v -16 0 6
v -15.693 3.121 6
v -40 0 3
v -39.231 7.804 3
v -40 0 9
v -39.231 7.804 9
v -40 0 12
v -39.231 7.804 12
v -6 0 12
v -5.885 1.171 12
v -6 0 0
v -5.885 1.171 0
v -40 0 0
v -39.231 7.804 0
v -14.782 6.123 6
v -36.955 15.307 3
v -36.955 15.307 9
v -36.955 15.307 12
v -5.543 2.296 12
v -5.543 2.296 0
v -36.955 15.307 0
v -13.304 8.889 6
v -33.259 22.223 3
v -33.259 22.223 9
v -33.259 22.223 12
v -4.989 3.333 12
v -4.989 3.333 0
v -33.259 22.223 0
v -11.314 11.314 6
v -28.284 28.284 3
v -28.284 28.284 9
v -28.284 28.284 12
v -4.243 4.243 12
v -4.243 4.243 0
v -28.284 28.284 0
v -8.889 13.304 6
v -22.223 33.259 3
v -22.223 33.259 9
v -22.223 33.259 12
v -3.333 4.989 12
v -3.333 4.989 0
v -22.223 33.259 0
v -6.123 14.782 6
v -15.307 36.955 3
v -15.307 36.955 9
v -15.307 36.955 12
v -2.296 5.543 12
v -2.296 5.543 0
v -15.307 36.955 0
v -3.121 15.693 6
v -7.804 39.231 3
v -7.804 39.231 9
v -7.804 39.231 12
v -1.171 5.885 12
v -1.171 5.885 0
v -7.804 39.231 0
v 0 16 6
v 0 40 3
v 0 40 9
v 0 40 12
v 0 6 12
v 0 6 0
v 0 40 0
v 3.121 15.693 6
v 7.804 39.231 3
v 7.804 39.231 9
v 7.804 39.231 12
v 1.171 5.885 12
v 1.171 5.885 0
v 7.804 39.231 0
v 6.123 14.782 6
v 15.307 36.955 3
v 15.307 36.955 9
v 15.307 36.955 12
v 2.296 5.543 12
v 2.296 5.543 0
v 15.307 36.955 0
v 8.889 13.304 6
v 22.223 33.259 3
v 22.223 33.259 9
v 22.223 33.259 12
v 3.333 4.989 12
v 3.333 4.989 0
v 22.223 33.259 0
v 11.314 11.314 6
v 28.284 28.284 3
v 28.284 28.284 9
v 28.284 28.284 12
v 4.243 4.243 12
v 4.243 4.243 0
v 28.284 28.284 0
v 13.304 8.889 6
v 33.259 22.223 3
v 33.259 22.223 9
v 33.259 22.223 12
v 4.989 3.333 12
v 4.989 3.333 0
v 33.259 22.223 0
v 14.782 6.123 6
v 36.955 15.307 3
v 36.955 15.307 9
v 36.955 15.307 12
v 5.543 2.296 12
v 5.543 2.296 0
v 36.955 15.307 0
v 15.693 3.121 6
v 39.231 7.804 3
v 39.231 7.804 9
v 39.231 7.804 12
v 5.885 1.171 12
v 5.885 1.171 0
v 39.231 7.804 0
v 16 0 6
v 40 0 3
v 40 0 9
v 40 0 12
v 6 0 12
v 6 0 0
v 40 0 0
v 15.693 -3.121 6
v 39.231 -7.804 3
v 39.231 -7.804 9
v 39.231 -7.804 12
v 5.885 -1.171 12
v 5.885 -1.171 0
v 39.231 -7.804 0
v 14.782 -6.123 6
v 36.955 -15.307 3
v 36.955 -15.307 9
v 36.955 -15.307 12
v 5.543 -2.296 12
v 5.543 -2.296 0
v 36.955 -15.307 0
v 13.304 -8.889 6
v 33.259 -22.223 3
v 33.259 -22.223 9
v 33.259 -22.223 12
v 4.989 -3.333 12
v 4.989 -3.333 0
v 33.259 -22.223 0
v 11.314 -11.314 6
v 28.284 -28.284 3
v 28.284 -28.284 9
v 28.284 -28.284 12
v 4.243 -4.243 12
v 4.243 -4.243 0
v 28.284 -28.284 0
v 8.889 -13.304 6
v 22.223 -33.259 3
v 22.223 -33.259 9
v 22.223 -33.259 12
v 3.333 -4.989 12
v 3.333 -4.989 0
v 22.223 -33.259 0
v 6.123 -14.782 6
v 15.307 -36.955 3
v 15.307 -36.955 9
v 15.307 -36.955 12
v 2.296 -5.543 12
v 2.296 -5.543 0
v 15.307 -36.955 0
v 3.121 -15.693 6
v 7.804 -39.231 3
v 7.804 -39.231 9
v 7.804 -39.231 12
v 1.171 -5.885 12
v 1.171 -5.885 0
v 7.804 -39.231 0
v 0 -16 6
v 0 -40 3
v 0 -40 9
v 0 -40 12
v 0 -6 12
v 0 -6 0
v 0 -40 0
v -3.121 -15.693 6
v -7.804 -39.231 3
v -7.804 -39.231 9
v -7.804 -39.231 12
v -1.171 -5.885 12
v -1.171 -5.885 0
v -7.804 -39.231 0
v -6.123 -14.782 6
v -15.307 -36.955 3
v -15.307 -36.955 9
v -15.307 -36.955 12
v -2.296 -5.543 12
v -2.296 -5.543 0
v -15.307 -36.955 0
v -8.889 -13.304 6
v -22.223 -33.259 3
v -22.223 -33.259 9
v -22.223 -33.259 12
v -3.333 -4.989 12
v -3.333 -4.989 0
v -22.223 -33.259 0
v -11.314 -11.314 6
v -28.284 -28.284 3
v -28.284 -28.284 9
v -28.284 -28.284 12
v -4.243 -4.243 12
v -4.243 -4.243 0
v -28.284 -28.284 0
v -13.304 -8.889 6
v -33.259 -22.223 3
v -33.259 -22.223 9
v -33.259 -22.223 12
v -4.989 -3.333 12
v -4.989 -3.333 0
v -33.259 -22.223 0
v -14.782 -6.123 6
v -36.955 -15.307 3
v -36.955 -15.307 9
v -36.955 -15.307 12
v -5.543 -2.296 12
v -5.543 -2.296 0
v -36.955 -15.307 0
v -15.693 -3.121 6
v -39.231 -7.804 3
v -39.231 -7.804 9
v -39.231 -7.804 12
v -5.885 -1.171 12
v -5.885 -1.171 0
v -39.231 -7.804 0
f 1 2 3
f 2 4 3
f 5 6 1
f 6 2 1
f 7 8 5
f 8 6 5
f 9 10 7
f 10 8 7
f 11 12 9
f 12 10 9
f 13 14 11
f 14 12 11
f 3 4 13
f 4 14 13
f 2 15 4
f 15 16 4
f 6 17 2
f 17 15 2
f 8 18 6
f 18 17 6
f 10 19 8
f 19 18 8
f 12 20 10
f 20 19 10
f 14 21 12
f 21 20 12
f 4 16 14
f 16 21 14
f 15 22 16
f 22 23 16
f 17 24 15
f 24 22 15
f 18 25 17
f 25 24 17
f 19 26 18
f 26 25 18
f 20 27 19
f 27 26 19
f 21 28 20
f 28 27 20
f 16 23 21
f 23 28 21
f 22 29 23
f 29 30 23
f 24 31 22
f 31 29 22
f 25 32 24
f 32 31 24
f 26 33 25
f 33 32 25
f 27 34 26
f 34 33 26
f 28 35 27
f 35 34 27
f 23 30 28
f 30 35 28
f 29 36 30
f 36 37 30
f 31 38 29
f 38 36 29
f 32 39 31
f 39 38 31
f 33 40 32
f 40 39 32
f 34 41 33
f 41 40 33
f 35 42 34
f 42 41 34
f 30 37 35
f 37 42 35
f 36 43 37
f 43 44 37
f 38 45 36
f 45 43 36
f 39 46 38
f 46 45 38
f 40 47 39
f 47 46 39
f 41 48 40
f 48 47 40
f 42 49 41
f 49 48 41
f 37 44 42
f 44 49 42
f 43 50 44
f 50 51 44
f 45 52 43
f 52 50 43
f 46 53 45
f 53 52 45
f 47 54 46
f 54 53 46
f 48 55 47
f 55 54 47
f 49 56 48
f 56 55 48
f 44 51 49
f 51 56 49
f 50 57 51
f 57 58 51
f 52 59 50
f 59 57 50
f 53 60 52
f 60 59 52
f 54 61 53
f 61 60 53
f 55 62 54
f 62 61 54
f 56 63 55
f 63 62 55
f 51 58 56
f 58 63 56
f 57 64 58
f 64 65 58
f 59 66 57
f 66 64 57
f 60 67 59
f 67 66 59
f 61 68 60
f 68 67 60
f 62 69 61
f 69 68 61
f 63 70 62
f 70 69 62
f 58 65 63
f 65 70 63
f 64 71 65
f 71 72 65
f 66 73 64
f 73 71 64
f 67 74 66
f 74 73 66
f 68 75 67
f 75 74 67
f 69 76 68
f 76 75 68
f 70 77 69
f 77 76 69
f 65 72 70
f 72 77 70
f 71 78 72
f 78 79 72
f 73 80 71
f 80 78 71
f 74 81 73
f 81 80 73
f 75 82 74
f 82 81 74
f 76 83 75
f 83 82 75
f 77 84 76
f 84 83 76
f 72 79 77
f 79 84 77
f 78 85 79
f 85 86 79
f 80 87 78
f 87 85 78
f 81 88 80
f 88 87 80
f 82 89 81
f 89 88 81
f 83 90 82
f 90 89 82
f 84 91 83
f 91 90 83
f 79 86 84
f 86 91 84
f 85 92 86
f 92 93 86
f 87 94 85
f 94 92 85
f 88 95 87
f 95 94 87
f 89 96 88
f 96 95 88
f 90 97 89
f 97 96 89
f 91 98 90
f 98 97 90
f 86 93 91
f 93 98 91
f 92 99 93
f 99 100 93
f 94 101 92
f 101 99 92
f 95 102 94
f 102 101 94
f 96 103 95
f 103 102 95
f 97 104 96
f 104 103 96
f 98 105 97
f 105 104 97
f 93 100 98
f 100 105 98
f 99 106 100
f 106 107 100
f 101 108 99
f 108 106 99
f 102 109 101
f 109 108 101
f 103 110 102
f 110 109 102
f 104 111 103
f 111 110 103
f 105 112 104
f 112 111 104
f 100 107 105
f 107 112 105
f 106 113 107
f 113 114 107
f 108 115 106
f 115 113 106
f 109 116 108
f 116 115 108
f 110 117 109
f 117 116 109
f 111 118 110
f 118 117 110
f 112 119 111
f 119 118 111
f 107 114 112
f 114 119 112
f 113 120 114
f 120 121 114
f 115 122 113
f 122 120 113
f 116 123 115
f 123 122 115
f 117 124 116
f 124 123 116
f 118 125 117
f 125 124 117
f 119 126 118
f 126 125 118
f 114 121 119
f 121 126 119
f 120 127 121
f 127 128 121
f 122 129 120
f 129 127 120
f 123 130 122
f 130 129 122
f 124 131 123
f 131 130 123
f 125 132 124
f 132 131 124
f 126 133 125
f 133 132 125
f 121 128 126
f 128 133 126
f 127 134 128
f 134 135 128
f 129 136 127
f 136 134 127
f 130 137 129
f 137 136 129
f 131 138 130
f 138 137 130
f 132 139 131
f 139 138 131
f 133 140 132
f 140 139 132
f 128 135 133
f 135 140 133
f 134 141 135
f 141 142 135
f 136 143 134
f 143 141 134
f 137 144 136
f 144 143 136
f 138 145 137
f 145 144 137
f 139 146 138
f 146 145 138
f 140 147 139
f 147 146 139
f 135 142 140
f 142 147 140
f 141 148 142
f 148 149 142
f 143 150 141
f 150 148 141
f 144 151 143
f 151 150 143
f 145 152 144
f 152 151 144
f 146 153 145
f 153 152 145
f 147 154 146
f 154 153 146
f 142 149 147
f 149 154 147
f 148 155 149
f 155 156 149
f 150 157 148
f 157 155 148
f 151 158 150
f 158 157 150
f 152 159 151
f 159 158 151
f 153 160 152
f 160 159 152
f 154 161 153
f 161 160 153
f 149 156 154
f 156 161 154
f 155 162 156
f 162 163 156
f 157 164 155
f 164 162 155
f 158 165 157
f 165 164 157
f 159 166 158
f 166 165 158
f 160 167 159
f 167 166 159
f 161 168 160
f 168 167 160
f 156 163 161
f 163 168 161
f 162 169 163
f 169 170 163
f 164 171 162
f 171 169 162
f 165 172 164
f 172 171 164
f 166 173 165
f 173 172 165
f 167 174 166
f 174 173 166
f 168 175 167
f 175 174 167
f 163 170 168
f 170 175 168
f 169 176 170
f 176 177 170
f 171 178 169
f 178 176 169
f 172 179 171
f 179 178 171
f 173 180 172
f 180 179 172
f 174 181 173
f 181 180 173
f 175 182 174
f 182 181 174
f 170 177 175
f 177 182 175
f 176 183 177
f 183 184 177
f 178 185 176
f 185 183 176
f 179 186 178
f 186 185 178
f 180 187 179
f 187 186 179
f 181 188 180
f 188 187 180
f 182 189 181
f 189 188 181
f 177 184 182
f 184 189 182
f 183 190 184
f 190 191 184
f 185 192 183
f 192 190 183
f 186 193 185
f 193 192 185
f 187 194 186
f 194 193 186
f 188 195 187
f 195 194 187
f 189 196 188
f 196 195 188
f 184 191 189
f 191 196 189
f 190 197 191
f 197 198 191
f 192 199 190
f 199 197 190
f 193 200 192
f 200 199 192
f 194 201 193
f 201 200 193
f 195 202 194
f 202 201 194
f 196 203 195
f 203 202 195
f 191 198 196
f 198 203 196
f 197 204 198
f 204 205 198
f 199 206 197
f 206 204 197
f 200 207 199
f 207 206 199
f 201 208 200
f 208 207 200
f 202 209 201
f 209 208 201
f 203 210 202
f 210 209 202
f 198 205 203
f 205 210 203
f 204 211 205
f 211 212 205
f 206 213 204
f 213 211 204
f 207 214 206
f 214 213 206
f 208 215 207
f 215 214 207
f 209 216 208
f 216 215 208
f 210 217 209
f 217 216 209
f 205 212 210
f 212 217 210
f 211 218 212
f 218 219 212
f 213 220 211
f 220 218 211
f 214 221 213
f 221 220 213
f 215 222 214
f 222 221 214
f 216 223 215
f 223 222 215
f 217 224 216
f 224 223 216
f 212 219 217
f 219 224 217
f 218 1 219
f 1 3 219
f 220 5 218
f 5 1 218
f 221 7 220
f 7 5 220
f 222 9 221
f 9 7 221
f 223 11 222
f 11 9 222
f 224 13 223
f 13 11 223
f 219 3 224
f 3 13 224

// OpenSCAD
$fn = 32;

// ----------------------------------------------------------------------
// Revolved part: V-groove pulley R40
// ----------------------------------------------------------------------

// --- parameters (mm) ---
bore_r = 6;               // bore radius
rim_r = 40;               // rim radius
rim_t = 12;               // rim width
groove_r = 16;            // groove root radius
groove_w = 3;             // groove half width
revolve_angle = 360;      // revolve sweep, degrees

bore_d = 2 * bore_r;
rim_d = 2 * rim_r;
groove_d = 2 * groove_r;

profile = [[6, 0], [40, 0], [40, 3], [16, 6], [40, 9], [40, 12], [6, 12]];  // primary outline, 7 points, counter clockwise

// --- the one profile operation ---
rotate_extrude(angle = revolve_angle) polygon(points = profile);
